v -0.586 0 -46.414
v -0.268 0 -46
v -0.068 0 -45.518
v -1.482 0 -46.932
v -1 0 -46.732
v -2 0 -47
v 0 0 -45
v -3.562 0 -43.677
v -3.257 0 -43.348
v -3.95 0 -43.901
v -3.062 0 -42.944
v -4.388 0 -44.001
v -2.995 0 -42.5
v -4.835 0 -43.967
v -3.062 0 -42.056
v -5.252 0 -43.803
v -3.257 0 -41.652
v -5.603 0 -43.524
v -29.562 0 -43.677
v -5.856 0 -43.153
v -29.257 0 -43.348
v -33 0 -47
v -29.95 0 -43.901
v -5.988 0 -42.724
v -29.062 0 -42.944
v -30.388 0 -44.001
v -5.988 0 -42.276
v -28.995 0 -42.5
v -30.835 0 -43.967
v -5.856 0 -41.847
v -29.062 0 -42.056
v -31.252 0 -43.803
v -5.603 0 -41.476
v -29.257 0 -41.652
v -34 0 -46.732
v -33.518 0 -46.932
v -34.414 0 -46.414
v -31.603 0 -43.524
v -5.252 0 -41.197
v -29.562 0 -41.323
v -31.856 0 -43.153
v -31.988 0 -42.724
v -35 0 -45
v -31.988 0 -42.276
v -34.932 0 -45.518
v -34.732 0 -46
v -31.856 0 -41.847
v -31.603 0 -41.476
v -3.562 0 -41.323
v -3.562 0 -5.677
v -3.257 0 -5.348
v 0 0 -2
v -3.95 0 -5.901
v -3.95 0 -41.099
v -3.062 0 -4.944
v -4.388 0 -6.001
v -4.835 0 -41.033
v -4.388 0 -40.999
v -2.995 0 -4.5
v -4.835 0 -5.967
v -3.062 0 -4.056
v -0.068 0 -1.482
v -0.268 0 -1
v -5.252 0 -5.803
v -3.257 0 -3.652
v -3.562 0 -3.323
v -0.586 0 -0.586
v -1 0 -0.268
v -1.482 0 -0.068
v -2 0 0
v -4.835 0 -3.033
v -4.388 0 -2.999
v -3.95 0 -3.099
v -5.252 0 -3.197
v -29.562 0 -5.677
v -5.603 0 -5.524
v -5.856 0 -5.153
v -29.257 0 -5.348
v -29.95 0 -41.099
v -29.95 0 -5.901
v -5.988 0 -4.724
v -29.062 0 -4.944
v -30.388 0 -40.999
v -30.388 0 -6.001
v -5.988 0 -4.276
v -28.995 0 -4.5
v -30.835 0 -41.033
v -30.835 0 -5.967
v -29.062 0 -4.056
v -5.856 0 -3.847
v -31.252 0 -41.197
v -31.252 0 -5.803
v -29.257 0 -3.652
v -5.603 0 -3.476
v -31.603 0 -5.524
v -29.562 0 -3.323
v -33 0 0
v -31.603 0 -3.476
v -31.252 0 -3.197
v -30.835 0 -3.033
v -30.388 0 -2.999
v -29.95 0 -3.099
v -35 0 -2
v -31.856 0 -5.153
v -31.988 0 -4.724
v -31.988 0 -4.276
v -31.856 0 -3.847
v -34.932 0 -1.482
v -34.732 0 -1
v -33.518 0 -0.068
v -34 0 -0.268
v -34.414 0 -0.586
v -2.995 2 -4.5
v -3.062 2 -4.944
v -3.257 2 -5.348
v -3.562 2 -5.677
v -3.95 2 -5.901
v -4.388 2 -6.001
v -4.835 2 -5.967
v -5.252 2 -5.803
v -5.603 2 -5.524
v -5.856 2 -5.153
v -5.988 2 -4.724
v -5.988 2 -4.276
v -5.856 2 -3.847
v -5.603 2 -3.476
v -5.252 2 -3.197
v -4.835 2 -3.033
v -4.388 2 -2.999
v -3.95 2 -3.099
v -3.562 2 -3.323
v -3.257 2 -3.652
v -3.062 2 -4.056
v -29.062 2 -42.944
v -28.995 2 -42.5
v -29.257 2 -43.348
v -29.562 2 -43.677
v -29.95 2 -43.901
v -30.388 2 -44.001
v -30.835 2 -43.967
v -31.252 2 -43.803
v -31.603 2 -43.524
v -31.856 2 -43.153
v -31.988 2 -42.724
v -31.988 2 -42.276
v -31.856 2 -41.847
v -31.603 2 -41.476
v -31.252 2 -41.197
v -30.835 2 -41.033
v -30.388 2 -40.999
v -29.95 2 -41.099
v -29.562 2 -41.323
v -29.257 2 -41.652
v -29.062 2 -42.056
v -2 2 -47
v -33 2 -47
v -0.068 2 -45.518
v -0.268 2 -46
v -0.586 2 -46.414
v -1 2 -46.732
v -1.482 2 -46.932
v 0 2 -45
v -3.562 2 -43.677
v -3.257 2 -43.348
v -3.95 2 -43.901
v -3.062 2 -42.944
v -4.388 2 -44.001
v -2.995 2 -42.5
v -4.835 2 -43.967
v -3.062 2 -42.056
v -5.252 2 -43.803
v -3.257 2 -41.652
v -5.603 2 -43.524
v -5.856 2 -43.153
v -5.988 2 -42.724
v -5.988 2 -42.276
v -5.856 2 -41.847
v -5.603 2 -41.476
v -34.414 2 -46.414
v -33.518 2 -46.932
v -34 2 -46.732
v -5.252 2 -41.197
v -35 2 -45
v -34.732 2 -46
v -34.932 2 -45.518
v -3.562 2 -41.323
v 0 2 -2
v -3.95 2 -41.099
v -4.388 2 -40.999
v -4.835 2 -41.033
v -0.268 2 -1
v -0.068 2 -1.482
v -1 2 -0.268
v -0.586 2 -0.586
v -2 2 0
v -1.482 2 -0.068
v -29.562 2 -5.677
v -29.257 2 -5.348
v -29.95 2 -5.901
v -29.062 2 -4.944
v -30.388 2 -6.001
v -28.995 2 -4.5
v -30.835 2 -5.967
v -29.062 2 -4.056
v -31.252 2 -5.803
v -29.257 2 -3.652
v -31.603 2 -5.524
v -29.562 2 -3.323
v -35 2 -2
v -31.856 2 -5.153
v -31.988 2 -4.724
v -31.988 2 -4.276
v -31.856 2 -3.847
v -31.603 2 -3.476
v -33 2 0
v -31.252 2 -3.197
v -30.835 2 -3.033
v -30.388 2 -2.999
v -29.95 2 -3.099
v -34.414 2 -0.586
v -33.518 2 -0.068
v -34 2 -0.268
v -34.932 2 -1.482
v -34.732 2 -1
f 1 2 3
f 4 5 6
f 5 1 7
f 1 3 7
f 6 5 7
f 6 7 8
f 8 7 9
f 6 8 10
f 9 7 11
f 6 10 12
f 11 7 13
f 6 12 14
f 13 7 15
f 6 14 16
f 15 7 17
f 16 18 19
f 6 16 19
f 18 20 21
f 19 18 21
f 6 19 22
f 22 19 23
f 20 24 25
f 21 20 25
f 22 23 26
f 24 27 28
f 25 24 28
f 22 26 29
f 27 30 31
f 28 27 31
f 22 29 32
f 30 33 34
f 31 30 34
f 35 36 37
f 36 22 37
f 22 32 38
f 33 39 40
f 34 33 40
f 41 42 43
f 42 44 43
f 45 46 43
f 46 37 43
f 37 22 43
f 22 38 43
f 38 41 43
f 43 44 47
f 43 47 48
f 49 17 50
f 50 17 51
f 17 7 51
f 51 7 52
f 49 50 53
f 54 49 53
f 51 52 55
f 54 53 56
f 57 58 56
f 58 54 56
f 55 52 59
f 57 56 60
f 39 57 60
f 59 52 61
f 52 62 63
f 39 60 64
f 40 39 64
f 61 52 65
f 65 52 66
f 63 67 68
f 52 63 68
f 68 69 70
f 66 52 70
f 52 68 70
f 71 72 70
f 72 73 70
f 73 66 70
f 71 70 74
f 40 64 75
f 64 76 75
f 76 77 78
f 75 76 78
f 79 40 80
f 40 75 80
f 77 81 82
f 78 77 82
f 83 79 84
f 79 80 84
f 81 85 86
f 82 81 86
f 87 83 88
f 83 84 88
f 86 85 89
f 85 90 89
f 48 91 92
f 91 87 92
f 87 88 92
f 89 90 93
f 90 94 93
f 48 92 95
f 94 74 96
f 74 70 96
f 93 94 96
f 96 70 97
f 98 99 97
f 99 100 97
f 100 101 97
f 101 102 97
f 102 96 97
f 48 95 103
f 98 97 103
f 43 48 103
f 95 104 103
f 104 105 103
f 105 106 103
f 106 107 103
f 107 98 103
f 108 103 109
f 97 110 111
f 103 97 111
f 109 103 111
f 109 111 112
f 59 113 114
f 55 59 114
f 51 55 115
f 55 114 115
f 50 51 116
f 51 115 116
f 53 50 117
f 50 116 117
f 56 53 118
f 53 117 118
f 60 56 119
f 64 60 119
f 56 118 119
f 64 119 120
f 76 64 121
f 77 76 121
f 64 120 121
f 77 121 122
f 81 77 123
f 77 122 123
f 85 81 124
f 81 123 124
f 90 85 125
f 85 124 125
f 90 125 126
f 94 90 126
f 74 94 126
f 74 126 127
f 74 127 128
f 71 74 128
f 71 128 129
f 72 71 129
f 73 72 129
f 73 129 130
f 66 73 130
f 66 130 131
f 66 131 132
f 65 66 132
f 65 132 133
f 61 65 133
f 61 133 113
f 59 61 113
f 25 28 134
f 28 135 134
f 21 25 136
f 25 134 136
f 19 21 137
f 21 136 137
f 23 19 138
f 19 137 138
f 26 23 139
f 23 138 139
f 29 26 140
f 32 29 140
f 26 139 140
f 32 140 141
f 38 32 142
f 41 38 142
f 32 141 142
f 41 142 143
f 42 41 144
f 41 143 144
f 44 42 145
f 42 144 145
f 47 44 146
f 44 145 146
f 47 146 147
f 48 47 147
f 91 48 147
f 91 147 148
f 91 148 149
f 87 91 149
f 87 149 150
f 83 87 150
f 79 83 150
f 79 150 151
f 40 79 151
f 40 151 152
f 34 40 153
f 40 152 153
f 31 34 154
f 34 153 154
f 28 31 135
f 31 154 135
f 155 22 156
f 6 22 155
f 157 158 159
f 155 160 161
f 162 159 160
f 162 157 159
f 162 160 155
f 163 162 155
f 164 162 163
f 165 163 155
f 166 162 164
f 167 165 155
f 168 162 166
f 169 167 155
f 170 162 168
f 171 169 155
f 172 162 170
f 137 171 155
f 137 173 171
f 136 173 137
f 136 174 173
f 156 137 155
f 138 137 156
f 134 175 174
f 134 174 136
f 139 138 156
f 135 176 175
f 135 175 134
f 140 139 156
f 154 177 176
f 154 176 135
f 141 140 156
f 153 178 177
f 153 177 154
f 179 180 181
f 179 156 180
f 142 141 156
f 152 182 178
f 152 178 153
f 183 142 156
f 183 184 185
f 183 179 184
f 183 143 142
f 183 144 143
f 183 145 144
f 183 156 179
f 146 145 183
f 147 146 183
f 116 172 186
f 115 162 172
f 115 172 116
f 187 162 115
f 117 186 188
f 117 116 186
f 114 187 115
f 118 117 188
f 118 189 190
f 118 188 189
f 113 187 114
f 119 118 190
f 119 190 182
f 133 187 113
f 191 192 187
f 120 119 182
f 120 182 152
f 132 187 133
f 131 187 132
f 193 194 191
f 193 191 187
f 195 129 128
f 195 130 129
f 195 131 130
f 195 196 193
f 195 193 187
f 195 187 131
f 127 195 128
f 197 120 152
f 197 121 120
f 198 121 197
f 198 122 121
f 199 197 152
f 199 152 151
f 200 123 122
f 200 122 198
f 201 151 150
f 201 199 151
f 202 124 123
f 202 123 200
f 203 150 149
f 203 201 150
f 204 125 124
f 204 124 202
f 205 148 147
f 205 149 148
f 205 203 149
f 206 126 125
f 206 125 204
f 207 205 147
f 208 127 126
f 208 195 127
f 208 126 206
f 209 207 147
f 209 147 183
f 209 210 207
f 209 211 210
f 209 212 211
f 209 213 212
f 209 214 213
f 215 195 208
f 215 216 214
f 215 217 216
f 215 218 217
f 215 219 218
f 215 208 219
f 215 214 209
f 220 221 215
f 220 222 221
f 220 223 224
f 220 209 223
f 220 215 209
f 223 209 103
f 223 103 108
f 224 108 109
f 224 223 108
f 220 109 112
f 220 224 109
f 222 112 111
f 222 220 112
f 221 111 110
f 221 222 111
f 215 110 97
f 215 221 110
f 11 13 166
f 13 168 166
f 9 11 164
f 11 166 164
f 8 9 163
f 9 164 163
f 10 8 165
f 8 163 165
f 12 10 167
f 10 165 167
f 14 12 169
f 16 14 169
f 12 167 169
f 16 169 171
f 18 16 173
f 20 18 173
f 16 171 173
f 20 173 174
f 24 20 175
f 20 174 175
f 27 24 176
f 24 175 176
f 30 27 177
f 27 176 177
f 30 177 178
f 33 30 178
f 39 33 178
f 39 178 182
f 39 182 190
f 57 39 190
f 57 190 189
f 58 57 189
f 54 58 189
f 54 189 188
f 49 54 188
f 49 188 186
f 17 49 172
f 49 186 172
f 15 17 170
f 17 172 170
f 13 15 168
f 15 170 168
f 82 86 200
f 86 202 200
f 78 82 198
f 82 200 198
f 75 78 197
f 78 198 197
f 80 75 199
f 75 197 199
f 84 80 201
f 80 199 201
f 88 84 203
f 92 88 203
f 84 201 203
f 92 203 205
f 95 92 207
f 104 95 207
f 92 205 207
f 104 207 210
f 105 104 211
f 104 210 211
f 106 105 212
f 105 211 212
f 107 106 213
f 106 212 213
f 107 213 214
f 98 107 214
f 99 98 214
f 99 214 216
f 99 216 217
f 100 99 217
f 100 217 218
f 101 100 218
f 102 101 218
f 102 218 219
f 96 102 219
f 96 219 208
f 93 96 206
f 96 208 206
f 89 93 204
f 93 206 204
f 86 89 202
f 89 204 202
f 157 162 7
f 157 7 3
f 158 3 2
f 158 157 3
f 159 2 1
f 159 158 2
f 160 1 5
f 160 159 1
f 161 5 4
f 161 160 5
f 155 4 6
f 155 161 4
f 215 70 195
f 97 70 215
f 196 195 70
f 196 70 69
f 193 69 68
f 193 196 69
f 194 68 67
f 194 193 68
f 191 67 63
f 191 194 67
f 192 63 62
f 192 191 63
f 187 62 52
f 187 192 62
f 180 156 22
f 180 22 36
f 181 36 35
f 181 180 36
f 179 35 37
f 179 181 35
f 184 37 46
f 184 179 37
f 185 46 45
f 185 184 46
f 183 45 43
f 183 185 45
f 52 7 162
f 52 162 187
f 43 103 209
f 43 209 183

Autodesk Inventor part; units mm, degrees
ref_plane "YZ Plane" through (0, 0, 0) normal (1, 0, 0) x (0, 1, 0)
ref_plane "XZ Plane" through (0, 0, 0) normal (0, 1, 0) x (-1, 0, 0)
ref_plane "XY Plane" through (0, 0, 0) normal (0, 0, 1) x (1, 0, 0)
sketch "Esboço1" plane through (0, 0, 0) normal (0, 1, 0) x (-1, 0, 0)
  line L0 (0, 0) -> (35, 0)
  line L1 (35, 0) -> (35, -47)
  line L2 (35, -47) -> (0, -47)
  line L3 (0, -47) -> (0, 0)
  dimension "d0" = 35
  dimension "d1" = 47
extrude "Extrusão1" add sketch "Esboço1" along normal blind 2
fillet "Arredondamento1" radius 2 4 edges at (0, 1, 0) (0, 1, -47) (-35, 1, 0) (-35, 1, -47)
sketch "Esboço5" plane through (0, 2, 0) normal (0, 1, 0) x (1, 0, 0)
  circle A0 centre (-4.5, 42.5) radius 1.505
  line L0 (-2, 47) -> (-33, 47) projected
  line L1 (0, 2) -> (0, 45) projected
  circle A1 centre (-30.5, 42.5) radius 1.505
  circle A2 centre (-4.5, 4.5) radius 1.505
  circle A3 centre (-30.5, 4.5) radius 1.505
  point P0 (0, 0)
  dimension "d26" = 3.01
  dimension "d27" = 4.5
  dimension "d28" = 4.5
  dimension "d31" = 26
  dimension "d34" = 38
extrude "Extrusão4" cut sketch "Esboço5" against normal blind 4.5
equation "\"d37\" = d28"
properties part number "Tampa"
